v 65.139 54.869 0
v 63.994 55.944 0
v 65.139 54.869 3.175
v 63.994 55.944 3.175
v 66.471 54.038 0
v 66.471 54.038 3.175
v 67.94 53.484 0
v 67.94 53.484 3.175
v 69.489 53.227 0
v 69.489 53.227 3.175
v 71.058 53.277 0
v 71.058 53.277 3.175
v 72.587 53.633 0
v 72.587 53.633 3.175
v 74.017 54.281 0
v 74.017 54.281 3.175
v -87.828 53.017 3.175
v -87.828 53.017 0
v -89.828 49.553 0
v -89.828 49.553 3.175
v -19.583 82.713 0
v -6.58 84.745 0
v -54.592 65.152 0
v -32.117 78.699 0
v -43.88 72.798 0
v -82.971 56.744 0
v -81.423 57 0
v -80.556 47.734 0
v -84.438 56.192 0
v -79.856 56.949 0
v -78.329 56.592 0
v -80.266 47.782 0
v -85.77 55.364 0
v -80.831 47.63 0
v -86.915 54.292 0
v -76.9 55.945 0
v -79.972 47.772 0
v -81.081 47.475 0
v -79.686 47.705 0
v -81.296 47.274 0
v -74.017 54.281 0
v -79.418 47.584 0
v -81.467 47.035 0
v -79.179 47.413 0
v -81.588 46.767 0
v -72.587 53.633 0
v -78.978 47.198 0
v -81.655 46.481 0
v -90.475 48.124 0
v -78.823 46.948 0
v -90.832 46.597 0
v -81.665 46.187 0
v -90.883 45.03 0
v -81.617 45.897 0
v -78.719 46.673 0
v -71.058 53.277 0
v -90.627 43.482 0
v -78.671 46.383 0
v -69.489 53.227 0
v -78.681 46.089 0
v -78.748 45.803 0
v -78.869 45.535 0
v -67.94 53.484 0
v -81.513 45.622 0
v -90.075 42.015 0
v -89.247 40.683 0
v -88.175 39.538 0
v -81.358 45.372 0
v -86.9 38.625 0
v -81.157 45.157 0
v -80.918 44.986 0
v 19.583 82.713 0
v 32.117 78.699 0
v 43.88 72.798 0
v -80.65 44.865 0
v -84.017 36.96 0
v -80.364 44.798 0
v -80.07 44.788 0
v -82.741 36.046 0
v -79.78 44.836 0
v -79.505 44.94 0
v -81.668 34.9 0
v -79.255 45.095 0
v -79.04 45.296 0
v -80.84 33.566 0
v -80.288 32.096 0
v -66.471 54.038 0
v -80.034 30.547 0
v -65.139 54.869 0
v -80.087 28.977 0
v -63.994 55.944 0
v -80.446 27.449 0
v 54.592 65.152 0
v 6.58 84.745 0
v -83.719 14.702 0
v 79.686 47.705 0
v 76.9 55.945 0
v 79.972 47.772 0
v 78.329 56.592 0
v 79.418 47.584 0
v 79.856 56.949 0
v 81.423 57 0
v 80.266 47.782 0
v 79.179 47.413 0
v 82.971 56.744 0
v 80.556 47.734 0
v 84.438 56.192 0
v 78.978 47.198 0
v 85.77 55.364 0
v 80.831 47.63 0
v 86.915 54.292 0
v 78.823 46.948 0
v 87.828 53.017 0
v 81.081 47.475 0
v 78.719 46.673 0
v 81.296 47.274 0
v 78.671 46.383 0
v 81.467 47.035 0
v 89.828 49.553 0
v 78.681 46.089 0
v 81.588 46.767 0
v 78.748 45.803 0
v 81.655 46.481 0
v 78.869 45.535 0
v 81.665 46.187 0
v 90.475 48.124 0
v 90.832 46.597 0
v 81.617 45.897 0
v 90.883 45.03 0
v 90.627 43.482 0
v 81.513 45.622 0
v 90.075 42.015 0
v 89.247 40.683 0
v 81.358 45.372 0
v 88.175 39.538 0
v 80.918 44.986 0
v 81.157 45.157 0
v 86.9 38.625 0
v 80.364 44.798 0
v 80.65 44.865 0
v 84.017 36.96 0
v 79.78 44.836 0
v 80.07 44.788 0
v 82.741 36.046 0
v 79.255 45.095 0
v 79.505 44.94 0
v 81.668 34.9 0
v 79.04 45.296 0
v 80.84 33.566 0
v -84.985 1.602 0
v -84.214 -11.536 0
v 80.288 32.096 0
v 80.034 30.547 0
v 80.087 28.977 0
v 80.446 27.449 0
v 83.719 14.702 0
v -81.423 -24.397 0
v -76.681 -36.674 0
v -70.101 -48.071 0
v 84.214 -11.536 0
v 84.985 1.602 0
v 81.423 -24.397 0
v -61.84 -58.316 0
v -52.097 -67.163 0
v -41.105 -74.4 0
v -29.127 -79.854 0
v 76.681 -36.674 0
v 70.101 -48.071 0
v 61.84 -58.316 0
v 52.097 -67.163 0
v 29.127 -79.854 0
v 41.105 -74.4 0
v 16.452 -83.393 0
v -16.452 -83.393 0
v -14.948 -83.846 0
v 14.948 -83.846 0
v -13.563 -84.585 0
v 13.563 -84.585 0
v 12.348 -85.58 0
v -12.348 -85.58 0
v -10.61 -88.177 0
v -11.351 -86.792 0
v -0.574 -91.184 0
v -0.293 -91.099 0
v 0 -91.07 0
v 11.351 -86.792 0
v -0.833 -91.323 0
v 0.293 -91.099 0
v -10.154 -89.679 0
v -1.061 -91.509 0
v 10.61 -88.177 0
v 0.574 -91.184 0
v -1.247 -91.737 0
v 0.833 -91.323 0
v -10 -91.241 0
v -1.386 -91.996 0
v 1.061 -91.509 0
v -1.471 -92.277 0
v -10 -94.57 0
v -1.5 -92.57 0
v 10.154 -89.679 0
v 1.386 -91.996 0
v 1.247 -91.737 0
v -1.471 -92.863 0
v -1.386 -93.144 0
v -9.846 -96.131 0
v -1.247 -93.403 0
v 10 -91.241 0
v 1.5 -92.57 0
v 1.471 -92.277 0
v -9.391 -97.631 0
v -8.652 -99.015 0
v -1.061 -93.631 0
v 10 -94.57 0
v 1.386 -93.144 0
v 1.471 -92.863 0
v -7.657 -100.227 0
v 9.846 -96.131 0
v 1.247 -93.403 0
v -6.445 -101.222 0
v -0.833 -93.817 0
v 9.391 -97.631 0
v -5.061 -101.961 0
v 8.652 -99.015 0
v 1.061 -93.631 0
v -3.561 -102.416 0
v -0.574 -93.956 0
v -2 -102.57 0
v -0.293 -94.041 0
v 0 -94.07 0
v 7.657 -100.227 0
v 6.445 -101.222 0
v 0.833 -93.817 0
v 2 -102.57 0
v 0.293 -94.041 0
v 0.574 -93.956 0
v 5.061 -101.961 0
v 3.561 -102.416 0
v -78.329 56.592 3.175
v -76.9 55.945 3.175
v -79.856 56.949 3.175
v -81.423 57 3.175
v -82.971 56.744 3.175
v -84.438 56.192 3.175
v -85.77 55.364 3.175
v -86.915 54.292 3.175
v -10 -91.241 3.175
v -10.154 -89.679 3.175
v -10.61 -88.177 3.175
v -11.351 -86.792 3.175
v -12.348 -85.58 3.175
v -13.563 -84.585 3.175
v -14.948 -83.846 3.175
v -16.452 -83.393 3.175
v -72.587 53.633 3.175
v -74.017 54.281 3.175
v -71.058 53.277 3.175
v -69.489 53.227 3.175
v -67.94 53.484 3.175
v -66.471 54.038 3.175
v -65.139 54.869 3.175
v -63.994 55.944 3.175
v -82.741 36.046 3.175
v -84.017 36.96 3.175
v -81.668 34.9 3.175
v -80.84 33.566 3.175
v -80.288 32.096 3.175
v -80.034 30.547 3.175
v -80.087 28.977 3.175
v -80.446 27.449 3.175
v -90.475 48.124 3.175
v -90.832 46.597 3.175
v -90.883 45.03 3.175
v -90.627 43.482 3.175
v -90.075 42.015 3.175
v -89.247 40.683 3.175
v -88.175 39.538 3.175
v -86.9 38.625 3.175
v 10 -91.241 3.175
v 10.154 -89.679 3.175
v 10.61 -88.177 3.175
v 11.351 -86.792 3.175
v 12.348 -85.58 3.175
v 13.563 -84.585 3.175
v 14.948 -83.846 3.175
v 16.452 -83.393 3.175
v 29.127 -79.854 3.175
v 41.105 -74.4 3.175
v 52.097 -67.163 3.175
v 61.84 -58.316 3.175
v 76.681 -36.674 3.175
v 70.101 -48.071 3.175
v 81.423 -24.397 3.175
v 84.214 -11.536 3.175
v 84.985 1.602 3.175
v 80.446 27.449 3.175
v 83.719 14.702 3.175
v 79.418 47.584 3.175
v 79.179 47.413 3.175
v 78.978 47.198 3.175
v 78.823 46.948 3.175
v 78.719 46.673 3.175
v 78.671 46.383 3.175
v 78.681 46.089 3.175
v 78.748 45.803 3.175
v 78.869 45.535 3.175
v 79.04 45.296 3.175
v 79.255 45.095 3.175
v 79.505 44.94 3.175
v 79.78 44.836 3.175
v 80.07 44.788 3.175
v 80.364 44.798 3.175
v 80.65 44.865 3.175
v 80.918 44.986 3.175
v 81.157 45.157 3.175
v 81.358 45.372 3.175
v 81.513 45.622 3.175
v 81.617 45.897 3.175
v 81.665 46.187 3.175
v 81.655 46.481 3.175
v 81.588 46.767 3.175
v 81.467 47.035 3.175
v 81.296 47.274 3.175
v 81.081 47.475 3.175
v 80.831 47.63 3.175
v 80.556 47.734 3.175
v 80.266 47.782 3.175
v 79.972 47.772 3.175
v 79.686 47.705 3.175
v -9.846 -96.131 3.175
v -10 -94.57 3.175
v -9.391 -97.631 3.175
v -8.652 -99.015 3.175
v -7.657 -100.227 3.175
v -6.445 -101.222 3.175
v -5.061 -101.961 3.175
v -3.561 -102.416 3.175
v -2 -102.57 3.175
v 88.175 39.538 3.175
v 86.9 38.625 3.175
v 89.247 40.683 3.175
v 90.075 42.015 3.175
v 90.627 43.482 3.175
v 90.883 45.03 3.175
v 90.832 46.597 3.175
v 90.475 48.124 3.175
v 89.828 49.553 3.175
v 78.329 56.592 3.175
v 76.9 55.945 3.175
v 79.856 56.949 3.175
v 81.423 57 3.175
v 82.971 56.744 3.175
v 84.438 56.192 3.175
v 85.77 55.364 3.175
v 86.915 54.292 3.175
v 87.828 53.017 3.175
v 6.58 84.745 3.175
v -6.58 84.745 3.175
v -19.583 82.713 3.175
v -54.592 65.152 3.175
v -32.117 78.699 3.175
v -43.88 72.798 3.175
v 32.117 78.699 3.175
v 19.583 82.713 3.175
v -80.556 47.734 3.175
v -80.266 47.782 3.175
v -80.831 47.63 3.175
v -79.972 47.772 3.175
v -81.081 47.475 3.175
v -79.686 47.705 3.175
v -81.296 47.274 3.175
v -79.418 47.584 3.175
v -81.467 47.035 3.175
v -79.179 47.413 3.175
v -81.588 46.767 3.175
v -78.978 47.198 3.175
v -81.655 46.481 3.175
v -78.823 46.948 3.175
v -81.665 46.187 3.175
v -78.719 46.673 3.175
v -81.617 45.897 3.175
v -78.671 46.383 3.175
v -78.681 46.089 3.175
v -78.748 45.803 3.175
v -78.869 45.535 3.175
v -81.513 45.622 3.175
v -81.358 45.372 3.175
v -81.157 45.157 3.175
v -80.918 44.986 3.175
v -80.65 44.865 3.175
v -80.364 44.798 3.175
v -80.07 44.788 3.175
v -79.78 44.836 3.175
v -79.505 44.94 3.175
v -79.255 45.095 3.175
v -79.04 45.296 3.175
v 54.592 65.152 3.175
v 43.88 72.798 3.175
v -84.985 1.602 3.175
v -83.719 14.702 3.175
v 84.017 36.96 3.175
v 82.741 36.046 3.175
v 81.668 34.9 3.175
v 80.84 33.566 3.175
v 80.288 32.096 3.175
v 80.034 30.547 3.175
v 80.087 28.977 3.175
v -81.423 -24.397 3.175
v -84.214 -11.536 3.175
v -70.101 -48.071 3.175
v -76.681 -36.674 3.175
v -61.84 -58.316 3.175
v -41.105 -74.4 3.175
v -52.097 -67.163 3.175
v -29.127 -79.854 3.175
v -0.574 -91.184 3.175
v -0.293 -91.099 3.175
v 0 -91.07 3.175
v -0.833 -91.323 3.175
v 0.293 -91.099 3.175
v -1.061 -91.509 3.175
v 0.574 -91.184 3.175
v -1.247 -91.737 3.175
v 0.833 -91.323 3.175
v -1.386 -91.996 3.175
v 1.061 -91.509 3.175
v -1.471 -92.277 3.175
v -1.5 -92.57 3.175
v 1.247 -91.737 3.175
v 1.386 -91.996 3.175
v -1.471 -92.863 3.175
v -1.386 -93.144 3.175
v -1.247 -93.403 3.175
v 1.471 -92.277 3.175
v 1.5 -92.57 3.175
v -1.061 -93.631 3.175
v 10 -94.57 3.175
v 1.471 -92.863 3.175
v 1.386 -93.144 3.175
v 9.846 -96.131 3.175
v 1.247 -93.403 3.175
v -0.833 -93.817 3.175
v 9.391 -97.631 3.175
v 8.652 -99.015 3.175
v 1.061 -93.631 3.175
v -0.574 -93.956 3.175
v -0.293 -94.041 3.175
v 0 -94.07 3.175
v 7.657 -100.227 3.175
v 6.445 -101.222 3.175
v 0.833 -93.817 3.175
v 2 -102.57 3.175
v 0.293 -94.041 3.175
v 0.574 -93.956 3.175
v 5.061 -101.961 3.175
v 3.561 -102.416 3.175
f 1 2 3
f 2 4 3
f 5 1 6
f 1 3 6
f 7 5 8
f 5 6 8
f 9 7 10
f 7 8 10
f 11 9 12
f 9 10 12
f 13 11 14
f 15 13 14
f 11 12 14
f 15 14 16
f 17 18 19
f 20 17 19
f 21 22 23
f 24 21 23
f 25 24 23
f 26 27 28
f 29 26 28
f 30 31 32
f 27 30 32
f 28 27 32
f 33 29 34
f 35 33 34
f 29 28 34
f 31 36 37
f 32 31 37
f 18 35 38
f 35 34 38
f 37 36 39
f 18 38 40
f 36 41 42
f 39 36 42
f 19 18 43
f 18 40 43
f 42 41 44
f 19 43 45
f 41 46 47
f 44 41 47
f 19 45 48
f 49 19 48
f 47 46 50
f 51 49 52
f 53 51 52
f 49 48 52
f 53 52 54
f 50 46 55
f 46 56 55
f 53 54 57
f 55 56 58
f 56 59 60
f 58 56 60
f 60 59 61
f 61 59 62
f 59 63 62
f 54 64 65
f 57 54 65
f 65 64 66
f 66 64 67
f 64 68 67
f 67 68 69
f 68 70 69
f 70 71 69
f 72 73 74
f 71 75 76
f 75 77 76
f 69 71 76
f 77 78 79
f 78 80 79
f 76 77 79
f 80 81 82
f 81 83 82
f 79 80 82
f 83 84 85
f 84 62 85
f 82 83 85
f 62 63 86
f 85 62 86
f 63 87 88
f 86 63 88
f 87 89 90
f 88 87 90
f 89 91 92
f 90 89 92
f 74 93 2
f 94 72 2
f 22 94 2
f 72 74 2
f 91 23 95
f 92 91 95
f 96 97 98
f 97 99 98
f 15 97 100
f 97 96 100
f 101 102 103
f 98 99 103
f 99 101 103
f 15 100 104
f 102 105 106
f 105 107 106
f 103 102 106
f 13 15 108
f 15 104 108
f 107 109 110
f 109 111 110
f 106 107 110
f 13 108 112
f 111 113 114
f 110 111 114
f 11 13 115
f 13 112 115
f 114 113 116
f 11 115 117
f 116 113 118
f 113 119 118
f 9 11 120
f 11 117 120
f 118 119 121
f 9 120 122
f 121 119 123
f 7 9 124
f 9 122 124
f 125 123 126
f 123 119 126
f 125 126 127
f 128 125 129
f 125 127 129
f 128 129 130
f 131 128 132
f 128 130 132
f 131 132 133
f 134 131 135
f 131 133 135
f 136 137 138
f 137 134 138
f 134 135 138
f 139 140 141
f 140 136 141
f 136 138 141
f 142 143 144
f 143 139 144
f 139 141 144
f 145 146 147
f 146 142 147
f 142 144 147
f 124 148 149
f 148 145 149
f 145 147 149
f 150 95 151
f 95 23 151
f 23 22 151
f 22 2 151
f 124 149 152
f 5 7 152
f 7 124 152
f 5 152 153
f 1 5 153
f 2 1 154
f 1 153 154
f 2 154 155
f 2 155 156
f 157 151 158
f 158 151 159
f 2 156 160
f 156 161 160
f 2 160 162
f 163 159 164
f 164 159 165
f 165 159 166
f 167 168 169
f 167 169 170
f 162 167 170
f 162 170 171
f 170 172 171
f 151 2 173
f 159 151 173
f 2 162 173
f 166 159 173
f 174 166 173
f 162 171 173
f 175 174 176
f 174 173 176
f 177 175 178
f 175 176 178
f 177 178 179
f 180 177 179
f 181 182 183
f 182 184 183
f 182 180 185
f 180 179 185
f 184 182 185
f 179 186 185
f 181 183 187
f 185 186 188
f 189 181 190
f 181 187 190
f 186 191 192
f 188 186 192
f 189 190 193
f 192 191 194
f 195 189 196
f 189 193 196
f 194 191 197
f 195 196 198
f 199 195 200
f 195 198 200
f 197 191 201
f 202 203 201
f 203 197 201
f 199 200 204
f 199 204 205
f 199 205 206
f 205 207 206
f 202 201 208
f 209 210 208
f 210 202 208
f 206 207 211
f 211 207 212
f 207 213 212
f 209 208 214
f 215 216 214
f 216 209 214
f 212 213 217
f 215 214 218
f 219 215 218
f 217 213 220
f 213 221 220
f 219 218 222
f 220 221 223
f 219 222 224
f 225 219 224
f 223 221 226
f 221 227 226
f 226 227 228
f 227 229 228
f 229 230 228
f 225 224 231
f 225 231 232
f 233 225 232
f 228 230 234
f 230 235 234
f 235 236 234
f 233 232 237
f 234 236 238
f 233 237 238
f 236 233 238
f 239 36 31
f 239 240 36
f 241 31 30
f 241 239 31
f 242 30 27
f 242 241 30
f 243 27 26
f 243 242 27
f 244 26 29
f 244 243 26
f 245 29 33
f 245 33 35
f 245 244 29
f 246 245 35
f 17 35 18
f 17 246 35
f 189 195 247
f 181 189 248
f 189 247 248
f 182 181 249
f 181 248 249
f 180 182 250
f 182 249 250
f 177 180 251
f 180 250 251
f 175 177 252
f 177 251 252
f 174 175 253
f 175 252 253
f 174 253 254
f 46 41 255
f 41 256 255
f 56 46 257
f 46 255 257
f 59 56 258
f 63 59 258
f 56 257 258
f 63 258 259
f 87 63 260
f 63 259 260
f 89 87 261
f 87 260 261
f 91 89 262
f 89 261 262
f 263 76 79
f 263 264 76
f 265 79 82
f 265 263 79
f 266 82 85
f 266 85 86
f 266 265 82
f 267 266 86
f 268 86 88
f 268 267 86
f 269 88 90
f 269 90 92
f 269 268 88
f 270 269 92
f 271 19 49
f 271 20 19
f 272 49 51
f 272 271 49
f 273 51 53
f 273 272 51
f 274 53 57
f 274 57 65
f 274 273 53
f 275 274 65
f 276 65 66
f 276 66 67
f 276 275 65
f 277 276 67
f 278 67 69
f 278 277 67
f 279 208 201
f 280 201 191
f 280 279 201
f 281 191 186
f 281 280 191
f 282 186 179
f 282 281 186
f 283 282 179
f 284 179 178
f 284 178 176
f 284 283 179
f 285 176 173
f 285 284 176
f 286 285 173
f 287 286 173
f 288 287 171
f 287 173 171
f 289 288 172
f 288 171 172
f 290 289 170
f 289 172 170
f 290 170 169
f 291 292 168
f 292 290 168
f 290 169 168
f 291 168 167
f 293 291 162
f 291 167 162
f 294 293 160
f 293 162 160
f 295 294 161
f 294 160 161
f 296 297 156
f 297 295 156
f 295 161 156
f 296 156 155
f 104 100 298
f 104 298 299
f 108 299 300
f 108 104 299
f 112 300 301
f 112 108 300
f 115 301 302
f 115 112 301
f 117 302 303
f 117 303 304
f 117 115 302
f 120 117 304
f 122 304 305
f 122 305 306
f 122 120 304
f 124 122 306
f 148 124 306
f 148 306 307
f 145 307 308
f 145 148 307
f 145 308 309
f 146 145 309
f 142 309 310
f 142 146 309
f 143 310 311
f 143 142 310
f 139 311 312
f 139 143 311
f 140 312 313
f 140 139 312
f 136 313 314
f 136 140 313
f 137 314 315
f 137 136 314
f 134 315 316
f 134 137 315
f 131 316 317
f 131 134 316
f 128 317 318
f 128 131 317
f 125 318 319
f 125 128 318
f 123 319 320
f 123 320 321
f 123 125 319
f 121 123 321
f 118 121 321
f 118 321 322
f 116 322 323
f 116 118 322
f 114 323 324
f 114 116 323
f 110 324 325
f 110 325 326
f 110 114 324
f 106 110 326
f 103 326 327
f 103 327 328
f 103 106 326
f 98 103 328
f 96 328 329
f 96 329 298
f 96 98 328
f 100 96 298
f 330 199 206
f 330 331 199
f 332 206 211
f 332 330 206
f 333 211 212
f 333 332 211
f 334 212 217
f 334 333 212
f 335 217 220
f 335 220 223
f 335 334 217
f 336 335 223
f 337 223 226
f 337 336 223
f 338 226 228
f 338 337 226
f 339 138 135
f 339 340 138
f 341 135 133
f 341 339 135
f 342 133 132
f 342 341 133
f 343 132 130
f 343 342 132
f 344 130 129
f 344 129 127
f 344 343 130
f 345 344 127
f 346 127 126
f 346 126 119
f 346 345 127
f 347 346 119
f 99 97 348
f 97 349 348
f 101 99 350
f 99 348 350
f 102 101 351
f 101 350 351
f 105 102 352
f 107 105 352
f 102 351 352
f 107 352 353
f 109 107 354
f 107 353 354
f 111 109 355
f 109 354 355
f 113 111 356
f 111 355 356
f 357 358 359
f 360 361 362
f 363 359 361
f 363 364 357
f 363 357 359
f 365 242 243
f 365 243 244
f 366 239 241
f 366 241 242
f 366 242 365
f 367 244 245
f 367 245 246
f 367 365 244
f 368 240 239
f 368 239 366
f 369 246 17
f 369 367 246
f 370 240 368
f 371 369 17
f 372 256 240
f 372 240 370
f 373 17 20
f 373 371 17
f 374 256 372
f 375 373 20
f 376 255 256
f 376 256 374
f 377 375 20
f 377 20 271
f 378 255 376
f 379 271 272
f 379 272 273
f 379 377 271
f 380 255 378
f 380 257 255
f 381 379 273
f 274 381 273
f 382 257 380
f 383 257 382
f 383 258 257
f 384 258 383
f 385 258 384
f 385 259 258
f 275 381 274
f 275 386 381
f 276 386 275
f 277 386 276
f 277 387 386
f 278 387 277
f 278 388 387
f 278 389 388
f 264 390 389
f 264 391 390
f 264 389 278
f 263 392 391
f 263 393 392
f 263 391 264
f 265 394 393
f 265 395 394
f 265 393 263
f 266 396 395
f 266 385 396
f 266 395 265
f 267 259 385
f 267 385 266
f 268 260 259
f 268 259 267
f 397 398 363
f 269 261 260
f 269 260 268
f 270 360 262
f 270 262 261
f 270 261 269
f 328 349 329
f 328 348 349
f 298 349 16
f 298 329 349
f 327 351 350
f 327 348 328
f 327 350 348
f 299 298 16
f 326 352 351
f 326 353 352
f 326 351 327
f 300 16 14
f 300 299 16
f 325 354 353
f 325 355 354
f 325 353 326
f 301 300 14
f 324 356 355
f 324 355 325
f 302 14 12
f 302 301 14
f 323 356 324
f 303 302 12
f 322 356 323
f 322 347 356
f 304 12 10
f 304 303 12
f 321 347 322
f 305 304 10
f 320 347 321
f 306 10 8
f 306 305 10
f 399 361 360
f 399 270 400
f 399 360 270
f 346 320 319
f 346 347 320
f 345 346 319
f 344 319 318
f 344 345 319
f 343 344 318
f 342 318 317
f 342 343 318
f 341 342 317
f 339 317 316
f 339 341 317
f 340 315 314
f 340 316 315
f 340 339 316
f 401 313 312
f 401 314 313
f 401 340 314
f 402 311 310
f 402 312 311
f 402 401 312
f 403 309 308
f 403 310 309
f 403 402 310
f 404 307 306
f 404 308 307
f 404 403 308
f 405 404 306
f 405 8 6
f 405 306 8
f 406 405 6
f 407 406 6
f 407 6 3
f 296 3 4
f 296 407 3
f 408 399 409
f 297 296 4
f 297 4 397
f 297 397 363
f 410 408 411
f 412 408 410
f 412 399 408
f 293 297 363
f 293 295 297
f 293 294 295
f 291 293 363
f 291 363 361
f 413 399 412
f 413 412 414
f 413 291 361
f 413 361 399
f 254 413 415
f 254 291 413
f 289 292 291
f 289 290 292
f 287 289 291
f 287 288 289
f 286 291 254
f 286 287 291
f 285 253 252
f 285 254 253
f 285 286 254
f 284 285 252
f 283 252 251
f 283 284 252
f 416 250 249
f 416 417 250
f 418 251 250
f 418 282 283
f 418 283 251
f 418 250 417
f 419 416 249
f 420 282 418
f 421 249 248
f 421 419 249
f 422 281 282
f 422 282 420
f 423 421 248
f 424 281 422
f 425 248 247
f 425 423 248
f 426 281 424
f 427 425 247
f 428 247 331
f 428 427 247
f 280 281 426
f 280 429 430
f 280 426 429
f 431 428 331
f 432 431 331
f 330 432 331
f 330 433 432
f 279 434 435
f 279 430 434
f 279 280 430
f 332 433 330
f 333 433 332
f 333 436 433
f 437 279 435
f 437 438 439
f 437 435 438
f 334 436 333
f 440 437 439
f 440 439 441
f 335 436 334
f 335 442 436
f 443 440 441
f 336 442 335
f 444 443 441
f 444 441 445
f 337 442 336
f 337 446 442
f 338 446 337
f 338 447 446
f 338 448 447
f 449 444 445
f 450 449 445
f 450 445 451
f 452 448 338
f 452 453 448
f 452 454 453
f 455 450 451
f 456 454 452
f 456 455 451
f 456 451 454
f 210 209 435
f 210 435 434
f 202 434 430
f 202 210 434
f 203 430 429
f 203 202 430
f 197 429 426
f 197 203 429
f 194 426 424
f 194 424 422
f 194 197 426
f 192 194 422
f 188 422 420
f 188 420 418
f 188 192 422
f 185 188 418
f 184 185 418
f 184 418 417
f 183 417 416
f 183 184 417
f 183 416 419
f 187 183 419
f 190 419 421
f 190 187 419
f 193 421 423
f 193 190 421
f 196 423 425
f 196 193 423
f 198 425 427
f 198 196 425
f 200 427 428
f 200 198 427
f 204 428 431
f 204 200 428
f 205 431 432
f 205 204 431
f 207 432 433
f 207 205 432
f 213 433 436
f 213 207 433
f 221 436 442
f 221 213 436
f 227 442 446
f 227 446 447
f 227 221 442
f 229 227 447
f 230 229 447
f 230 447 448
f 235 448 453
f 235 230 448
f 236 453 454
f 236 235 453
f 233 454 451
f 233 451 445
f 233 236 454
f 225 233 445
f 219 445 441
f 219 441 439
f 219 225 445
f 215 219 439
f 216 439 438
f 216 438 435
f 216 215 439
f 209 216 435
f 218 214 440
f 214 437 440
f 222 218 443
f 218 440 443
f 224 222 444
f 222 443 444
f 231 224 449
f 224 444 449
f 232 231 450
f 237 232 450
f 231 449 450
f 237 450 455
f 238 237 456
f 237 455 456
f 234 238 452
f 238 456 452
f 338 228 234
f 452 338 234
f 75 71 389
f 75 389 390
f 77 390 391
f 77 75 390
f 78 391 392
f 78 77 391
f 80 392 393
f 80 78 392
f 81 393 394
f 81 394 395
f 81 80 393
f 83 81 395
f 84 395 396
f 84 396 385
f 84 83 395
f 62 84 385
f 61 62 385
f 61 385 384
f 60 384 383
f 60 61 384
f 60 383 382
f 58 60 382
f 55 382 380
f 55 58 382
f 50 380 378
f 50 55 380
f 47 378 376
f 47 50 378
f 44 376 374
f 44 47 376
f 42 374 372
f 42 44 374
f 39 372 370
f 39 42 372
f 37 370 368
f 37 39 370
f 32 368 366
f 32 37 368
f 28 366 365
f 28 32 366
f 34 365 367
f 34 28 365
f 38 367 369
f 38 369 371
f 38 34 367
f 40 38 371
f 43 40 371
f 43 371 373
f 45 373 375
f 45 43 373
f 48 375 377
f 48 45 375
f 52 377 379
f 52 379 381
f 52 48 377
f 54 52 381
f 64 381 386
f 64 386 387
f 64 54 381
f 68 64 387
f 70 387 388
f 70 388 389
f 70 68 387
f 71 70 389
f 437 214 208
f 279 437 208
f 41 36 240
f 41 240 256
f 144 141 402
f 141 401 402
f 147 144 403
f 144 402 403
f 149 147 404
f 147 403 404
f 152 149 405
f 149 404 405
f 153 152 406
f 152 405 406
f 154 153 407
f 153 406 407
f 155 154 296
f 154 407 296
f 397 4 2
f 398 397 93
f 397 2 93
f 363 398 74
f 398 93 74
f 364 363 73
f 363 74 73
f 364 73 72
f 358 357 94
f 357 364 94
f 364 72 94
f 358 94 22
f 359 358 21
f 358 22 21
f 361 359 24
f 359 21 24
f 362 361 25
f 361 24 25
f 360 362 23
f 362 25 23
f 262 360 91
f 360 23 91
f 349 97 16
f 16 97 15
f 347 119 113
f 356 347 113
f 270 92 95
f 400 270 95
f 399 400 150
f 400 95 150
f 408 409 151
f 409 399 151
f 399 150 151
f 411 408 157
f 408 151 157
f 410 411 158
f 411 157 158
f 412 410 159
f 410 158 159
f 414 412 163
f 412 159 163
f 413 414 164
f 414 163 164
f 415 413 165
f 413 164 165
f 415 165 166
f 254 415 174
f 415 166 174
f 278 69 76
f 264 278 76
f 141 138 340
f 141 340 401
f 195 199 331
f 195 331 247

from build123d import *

# Parameters (mm, degrees)
SKETCH1_R                = 85
BOSS_EXTRUDE1_DEPTH      = 3.175
SKETCH2_W                = 20
SKETCH2_H                = 18.160284919
SKETCH2_R                = 1.5
BOSS_EXTRUDE2_DEPTH      = 3.175
FILLET1_R                = 8
CIRPATTERN1_COUNT        = 3
FILLET1_OF_CIRPATTERN1_R = 8


with BuildPart() as part:
    # Sketch1 → Boss-Extrude1 (new body)
    with BuildSketch(Plane.XY):
        Circle(SKETCH1_R)
    extrude(amount=BOSS_EXTRUDE1_DEPTH)

    # Sketch2 → Boss-Extrude2 (add, through all)
    with BuildSketch(Plane.XY):
        with Locations((0, -93.48985754)):
            Rectangle(SKETCH2_W, SKETCH2_H)
        with Locations((0, -92.57)):
            Circle(SKETCH2_R, mode=Mode.SUBTRACT)
    boss_extrude2 = extrude(amount=BOSS_EXTRUDE2_DEPTH)

    # Fillet1
    fillet1_edges = [part.edges().sort_by_distance(p)[0] for p in [
        (-10, -84.409715081, 1.5875),
        (-10, -102.57, 1.5875),
        (10, -102.57, 1.5875),
        (10, -84.409715081, 1.5875),
    ]]
    fillet(fillet1_edges, radius=FILLET1_R)

    # CirPattern1: Boss-Extrude2 ×3 about axis
    cirpattern1_axis = Axis((0, 0, 0), (0, 0, 1))
    for i in range(1, CIRPATTERN1_COUNT):
        add(boss_extrude2.rotate(cirpattern1_axis, i * 360 / CIRPATTERN1_COUNT))

    # Fillet1 of CirPattern1
    fillet1_of_cirpattern1_edges = [part.edges().sort_by_distance(p)[0] for p in [
        (78.100957586, 33.544603502, 1.5875),
        (93.828225666, 42.624745962, 1.5875),
        (83.828225666, 59.945254038, 1.5875),
        (68.100957586, 50.865111578, 1.5875),
        (-68.100957586, 50.865111578, 1.5875),
        (-83.828225666, 59.945254038, 1.5875),
        (-93.828225666, 42.624745962, 1.5875),
        (-78.100957586, 33.544603502, 1.5875),
    ]]
    fillet(fillet1_of_cirpattern1_edges, radius=FILLET1_OF_CIRPATTERN1_R)


solid = part.part
